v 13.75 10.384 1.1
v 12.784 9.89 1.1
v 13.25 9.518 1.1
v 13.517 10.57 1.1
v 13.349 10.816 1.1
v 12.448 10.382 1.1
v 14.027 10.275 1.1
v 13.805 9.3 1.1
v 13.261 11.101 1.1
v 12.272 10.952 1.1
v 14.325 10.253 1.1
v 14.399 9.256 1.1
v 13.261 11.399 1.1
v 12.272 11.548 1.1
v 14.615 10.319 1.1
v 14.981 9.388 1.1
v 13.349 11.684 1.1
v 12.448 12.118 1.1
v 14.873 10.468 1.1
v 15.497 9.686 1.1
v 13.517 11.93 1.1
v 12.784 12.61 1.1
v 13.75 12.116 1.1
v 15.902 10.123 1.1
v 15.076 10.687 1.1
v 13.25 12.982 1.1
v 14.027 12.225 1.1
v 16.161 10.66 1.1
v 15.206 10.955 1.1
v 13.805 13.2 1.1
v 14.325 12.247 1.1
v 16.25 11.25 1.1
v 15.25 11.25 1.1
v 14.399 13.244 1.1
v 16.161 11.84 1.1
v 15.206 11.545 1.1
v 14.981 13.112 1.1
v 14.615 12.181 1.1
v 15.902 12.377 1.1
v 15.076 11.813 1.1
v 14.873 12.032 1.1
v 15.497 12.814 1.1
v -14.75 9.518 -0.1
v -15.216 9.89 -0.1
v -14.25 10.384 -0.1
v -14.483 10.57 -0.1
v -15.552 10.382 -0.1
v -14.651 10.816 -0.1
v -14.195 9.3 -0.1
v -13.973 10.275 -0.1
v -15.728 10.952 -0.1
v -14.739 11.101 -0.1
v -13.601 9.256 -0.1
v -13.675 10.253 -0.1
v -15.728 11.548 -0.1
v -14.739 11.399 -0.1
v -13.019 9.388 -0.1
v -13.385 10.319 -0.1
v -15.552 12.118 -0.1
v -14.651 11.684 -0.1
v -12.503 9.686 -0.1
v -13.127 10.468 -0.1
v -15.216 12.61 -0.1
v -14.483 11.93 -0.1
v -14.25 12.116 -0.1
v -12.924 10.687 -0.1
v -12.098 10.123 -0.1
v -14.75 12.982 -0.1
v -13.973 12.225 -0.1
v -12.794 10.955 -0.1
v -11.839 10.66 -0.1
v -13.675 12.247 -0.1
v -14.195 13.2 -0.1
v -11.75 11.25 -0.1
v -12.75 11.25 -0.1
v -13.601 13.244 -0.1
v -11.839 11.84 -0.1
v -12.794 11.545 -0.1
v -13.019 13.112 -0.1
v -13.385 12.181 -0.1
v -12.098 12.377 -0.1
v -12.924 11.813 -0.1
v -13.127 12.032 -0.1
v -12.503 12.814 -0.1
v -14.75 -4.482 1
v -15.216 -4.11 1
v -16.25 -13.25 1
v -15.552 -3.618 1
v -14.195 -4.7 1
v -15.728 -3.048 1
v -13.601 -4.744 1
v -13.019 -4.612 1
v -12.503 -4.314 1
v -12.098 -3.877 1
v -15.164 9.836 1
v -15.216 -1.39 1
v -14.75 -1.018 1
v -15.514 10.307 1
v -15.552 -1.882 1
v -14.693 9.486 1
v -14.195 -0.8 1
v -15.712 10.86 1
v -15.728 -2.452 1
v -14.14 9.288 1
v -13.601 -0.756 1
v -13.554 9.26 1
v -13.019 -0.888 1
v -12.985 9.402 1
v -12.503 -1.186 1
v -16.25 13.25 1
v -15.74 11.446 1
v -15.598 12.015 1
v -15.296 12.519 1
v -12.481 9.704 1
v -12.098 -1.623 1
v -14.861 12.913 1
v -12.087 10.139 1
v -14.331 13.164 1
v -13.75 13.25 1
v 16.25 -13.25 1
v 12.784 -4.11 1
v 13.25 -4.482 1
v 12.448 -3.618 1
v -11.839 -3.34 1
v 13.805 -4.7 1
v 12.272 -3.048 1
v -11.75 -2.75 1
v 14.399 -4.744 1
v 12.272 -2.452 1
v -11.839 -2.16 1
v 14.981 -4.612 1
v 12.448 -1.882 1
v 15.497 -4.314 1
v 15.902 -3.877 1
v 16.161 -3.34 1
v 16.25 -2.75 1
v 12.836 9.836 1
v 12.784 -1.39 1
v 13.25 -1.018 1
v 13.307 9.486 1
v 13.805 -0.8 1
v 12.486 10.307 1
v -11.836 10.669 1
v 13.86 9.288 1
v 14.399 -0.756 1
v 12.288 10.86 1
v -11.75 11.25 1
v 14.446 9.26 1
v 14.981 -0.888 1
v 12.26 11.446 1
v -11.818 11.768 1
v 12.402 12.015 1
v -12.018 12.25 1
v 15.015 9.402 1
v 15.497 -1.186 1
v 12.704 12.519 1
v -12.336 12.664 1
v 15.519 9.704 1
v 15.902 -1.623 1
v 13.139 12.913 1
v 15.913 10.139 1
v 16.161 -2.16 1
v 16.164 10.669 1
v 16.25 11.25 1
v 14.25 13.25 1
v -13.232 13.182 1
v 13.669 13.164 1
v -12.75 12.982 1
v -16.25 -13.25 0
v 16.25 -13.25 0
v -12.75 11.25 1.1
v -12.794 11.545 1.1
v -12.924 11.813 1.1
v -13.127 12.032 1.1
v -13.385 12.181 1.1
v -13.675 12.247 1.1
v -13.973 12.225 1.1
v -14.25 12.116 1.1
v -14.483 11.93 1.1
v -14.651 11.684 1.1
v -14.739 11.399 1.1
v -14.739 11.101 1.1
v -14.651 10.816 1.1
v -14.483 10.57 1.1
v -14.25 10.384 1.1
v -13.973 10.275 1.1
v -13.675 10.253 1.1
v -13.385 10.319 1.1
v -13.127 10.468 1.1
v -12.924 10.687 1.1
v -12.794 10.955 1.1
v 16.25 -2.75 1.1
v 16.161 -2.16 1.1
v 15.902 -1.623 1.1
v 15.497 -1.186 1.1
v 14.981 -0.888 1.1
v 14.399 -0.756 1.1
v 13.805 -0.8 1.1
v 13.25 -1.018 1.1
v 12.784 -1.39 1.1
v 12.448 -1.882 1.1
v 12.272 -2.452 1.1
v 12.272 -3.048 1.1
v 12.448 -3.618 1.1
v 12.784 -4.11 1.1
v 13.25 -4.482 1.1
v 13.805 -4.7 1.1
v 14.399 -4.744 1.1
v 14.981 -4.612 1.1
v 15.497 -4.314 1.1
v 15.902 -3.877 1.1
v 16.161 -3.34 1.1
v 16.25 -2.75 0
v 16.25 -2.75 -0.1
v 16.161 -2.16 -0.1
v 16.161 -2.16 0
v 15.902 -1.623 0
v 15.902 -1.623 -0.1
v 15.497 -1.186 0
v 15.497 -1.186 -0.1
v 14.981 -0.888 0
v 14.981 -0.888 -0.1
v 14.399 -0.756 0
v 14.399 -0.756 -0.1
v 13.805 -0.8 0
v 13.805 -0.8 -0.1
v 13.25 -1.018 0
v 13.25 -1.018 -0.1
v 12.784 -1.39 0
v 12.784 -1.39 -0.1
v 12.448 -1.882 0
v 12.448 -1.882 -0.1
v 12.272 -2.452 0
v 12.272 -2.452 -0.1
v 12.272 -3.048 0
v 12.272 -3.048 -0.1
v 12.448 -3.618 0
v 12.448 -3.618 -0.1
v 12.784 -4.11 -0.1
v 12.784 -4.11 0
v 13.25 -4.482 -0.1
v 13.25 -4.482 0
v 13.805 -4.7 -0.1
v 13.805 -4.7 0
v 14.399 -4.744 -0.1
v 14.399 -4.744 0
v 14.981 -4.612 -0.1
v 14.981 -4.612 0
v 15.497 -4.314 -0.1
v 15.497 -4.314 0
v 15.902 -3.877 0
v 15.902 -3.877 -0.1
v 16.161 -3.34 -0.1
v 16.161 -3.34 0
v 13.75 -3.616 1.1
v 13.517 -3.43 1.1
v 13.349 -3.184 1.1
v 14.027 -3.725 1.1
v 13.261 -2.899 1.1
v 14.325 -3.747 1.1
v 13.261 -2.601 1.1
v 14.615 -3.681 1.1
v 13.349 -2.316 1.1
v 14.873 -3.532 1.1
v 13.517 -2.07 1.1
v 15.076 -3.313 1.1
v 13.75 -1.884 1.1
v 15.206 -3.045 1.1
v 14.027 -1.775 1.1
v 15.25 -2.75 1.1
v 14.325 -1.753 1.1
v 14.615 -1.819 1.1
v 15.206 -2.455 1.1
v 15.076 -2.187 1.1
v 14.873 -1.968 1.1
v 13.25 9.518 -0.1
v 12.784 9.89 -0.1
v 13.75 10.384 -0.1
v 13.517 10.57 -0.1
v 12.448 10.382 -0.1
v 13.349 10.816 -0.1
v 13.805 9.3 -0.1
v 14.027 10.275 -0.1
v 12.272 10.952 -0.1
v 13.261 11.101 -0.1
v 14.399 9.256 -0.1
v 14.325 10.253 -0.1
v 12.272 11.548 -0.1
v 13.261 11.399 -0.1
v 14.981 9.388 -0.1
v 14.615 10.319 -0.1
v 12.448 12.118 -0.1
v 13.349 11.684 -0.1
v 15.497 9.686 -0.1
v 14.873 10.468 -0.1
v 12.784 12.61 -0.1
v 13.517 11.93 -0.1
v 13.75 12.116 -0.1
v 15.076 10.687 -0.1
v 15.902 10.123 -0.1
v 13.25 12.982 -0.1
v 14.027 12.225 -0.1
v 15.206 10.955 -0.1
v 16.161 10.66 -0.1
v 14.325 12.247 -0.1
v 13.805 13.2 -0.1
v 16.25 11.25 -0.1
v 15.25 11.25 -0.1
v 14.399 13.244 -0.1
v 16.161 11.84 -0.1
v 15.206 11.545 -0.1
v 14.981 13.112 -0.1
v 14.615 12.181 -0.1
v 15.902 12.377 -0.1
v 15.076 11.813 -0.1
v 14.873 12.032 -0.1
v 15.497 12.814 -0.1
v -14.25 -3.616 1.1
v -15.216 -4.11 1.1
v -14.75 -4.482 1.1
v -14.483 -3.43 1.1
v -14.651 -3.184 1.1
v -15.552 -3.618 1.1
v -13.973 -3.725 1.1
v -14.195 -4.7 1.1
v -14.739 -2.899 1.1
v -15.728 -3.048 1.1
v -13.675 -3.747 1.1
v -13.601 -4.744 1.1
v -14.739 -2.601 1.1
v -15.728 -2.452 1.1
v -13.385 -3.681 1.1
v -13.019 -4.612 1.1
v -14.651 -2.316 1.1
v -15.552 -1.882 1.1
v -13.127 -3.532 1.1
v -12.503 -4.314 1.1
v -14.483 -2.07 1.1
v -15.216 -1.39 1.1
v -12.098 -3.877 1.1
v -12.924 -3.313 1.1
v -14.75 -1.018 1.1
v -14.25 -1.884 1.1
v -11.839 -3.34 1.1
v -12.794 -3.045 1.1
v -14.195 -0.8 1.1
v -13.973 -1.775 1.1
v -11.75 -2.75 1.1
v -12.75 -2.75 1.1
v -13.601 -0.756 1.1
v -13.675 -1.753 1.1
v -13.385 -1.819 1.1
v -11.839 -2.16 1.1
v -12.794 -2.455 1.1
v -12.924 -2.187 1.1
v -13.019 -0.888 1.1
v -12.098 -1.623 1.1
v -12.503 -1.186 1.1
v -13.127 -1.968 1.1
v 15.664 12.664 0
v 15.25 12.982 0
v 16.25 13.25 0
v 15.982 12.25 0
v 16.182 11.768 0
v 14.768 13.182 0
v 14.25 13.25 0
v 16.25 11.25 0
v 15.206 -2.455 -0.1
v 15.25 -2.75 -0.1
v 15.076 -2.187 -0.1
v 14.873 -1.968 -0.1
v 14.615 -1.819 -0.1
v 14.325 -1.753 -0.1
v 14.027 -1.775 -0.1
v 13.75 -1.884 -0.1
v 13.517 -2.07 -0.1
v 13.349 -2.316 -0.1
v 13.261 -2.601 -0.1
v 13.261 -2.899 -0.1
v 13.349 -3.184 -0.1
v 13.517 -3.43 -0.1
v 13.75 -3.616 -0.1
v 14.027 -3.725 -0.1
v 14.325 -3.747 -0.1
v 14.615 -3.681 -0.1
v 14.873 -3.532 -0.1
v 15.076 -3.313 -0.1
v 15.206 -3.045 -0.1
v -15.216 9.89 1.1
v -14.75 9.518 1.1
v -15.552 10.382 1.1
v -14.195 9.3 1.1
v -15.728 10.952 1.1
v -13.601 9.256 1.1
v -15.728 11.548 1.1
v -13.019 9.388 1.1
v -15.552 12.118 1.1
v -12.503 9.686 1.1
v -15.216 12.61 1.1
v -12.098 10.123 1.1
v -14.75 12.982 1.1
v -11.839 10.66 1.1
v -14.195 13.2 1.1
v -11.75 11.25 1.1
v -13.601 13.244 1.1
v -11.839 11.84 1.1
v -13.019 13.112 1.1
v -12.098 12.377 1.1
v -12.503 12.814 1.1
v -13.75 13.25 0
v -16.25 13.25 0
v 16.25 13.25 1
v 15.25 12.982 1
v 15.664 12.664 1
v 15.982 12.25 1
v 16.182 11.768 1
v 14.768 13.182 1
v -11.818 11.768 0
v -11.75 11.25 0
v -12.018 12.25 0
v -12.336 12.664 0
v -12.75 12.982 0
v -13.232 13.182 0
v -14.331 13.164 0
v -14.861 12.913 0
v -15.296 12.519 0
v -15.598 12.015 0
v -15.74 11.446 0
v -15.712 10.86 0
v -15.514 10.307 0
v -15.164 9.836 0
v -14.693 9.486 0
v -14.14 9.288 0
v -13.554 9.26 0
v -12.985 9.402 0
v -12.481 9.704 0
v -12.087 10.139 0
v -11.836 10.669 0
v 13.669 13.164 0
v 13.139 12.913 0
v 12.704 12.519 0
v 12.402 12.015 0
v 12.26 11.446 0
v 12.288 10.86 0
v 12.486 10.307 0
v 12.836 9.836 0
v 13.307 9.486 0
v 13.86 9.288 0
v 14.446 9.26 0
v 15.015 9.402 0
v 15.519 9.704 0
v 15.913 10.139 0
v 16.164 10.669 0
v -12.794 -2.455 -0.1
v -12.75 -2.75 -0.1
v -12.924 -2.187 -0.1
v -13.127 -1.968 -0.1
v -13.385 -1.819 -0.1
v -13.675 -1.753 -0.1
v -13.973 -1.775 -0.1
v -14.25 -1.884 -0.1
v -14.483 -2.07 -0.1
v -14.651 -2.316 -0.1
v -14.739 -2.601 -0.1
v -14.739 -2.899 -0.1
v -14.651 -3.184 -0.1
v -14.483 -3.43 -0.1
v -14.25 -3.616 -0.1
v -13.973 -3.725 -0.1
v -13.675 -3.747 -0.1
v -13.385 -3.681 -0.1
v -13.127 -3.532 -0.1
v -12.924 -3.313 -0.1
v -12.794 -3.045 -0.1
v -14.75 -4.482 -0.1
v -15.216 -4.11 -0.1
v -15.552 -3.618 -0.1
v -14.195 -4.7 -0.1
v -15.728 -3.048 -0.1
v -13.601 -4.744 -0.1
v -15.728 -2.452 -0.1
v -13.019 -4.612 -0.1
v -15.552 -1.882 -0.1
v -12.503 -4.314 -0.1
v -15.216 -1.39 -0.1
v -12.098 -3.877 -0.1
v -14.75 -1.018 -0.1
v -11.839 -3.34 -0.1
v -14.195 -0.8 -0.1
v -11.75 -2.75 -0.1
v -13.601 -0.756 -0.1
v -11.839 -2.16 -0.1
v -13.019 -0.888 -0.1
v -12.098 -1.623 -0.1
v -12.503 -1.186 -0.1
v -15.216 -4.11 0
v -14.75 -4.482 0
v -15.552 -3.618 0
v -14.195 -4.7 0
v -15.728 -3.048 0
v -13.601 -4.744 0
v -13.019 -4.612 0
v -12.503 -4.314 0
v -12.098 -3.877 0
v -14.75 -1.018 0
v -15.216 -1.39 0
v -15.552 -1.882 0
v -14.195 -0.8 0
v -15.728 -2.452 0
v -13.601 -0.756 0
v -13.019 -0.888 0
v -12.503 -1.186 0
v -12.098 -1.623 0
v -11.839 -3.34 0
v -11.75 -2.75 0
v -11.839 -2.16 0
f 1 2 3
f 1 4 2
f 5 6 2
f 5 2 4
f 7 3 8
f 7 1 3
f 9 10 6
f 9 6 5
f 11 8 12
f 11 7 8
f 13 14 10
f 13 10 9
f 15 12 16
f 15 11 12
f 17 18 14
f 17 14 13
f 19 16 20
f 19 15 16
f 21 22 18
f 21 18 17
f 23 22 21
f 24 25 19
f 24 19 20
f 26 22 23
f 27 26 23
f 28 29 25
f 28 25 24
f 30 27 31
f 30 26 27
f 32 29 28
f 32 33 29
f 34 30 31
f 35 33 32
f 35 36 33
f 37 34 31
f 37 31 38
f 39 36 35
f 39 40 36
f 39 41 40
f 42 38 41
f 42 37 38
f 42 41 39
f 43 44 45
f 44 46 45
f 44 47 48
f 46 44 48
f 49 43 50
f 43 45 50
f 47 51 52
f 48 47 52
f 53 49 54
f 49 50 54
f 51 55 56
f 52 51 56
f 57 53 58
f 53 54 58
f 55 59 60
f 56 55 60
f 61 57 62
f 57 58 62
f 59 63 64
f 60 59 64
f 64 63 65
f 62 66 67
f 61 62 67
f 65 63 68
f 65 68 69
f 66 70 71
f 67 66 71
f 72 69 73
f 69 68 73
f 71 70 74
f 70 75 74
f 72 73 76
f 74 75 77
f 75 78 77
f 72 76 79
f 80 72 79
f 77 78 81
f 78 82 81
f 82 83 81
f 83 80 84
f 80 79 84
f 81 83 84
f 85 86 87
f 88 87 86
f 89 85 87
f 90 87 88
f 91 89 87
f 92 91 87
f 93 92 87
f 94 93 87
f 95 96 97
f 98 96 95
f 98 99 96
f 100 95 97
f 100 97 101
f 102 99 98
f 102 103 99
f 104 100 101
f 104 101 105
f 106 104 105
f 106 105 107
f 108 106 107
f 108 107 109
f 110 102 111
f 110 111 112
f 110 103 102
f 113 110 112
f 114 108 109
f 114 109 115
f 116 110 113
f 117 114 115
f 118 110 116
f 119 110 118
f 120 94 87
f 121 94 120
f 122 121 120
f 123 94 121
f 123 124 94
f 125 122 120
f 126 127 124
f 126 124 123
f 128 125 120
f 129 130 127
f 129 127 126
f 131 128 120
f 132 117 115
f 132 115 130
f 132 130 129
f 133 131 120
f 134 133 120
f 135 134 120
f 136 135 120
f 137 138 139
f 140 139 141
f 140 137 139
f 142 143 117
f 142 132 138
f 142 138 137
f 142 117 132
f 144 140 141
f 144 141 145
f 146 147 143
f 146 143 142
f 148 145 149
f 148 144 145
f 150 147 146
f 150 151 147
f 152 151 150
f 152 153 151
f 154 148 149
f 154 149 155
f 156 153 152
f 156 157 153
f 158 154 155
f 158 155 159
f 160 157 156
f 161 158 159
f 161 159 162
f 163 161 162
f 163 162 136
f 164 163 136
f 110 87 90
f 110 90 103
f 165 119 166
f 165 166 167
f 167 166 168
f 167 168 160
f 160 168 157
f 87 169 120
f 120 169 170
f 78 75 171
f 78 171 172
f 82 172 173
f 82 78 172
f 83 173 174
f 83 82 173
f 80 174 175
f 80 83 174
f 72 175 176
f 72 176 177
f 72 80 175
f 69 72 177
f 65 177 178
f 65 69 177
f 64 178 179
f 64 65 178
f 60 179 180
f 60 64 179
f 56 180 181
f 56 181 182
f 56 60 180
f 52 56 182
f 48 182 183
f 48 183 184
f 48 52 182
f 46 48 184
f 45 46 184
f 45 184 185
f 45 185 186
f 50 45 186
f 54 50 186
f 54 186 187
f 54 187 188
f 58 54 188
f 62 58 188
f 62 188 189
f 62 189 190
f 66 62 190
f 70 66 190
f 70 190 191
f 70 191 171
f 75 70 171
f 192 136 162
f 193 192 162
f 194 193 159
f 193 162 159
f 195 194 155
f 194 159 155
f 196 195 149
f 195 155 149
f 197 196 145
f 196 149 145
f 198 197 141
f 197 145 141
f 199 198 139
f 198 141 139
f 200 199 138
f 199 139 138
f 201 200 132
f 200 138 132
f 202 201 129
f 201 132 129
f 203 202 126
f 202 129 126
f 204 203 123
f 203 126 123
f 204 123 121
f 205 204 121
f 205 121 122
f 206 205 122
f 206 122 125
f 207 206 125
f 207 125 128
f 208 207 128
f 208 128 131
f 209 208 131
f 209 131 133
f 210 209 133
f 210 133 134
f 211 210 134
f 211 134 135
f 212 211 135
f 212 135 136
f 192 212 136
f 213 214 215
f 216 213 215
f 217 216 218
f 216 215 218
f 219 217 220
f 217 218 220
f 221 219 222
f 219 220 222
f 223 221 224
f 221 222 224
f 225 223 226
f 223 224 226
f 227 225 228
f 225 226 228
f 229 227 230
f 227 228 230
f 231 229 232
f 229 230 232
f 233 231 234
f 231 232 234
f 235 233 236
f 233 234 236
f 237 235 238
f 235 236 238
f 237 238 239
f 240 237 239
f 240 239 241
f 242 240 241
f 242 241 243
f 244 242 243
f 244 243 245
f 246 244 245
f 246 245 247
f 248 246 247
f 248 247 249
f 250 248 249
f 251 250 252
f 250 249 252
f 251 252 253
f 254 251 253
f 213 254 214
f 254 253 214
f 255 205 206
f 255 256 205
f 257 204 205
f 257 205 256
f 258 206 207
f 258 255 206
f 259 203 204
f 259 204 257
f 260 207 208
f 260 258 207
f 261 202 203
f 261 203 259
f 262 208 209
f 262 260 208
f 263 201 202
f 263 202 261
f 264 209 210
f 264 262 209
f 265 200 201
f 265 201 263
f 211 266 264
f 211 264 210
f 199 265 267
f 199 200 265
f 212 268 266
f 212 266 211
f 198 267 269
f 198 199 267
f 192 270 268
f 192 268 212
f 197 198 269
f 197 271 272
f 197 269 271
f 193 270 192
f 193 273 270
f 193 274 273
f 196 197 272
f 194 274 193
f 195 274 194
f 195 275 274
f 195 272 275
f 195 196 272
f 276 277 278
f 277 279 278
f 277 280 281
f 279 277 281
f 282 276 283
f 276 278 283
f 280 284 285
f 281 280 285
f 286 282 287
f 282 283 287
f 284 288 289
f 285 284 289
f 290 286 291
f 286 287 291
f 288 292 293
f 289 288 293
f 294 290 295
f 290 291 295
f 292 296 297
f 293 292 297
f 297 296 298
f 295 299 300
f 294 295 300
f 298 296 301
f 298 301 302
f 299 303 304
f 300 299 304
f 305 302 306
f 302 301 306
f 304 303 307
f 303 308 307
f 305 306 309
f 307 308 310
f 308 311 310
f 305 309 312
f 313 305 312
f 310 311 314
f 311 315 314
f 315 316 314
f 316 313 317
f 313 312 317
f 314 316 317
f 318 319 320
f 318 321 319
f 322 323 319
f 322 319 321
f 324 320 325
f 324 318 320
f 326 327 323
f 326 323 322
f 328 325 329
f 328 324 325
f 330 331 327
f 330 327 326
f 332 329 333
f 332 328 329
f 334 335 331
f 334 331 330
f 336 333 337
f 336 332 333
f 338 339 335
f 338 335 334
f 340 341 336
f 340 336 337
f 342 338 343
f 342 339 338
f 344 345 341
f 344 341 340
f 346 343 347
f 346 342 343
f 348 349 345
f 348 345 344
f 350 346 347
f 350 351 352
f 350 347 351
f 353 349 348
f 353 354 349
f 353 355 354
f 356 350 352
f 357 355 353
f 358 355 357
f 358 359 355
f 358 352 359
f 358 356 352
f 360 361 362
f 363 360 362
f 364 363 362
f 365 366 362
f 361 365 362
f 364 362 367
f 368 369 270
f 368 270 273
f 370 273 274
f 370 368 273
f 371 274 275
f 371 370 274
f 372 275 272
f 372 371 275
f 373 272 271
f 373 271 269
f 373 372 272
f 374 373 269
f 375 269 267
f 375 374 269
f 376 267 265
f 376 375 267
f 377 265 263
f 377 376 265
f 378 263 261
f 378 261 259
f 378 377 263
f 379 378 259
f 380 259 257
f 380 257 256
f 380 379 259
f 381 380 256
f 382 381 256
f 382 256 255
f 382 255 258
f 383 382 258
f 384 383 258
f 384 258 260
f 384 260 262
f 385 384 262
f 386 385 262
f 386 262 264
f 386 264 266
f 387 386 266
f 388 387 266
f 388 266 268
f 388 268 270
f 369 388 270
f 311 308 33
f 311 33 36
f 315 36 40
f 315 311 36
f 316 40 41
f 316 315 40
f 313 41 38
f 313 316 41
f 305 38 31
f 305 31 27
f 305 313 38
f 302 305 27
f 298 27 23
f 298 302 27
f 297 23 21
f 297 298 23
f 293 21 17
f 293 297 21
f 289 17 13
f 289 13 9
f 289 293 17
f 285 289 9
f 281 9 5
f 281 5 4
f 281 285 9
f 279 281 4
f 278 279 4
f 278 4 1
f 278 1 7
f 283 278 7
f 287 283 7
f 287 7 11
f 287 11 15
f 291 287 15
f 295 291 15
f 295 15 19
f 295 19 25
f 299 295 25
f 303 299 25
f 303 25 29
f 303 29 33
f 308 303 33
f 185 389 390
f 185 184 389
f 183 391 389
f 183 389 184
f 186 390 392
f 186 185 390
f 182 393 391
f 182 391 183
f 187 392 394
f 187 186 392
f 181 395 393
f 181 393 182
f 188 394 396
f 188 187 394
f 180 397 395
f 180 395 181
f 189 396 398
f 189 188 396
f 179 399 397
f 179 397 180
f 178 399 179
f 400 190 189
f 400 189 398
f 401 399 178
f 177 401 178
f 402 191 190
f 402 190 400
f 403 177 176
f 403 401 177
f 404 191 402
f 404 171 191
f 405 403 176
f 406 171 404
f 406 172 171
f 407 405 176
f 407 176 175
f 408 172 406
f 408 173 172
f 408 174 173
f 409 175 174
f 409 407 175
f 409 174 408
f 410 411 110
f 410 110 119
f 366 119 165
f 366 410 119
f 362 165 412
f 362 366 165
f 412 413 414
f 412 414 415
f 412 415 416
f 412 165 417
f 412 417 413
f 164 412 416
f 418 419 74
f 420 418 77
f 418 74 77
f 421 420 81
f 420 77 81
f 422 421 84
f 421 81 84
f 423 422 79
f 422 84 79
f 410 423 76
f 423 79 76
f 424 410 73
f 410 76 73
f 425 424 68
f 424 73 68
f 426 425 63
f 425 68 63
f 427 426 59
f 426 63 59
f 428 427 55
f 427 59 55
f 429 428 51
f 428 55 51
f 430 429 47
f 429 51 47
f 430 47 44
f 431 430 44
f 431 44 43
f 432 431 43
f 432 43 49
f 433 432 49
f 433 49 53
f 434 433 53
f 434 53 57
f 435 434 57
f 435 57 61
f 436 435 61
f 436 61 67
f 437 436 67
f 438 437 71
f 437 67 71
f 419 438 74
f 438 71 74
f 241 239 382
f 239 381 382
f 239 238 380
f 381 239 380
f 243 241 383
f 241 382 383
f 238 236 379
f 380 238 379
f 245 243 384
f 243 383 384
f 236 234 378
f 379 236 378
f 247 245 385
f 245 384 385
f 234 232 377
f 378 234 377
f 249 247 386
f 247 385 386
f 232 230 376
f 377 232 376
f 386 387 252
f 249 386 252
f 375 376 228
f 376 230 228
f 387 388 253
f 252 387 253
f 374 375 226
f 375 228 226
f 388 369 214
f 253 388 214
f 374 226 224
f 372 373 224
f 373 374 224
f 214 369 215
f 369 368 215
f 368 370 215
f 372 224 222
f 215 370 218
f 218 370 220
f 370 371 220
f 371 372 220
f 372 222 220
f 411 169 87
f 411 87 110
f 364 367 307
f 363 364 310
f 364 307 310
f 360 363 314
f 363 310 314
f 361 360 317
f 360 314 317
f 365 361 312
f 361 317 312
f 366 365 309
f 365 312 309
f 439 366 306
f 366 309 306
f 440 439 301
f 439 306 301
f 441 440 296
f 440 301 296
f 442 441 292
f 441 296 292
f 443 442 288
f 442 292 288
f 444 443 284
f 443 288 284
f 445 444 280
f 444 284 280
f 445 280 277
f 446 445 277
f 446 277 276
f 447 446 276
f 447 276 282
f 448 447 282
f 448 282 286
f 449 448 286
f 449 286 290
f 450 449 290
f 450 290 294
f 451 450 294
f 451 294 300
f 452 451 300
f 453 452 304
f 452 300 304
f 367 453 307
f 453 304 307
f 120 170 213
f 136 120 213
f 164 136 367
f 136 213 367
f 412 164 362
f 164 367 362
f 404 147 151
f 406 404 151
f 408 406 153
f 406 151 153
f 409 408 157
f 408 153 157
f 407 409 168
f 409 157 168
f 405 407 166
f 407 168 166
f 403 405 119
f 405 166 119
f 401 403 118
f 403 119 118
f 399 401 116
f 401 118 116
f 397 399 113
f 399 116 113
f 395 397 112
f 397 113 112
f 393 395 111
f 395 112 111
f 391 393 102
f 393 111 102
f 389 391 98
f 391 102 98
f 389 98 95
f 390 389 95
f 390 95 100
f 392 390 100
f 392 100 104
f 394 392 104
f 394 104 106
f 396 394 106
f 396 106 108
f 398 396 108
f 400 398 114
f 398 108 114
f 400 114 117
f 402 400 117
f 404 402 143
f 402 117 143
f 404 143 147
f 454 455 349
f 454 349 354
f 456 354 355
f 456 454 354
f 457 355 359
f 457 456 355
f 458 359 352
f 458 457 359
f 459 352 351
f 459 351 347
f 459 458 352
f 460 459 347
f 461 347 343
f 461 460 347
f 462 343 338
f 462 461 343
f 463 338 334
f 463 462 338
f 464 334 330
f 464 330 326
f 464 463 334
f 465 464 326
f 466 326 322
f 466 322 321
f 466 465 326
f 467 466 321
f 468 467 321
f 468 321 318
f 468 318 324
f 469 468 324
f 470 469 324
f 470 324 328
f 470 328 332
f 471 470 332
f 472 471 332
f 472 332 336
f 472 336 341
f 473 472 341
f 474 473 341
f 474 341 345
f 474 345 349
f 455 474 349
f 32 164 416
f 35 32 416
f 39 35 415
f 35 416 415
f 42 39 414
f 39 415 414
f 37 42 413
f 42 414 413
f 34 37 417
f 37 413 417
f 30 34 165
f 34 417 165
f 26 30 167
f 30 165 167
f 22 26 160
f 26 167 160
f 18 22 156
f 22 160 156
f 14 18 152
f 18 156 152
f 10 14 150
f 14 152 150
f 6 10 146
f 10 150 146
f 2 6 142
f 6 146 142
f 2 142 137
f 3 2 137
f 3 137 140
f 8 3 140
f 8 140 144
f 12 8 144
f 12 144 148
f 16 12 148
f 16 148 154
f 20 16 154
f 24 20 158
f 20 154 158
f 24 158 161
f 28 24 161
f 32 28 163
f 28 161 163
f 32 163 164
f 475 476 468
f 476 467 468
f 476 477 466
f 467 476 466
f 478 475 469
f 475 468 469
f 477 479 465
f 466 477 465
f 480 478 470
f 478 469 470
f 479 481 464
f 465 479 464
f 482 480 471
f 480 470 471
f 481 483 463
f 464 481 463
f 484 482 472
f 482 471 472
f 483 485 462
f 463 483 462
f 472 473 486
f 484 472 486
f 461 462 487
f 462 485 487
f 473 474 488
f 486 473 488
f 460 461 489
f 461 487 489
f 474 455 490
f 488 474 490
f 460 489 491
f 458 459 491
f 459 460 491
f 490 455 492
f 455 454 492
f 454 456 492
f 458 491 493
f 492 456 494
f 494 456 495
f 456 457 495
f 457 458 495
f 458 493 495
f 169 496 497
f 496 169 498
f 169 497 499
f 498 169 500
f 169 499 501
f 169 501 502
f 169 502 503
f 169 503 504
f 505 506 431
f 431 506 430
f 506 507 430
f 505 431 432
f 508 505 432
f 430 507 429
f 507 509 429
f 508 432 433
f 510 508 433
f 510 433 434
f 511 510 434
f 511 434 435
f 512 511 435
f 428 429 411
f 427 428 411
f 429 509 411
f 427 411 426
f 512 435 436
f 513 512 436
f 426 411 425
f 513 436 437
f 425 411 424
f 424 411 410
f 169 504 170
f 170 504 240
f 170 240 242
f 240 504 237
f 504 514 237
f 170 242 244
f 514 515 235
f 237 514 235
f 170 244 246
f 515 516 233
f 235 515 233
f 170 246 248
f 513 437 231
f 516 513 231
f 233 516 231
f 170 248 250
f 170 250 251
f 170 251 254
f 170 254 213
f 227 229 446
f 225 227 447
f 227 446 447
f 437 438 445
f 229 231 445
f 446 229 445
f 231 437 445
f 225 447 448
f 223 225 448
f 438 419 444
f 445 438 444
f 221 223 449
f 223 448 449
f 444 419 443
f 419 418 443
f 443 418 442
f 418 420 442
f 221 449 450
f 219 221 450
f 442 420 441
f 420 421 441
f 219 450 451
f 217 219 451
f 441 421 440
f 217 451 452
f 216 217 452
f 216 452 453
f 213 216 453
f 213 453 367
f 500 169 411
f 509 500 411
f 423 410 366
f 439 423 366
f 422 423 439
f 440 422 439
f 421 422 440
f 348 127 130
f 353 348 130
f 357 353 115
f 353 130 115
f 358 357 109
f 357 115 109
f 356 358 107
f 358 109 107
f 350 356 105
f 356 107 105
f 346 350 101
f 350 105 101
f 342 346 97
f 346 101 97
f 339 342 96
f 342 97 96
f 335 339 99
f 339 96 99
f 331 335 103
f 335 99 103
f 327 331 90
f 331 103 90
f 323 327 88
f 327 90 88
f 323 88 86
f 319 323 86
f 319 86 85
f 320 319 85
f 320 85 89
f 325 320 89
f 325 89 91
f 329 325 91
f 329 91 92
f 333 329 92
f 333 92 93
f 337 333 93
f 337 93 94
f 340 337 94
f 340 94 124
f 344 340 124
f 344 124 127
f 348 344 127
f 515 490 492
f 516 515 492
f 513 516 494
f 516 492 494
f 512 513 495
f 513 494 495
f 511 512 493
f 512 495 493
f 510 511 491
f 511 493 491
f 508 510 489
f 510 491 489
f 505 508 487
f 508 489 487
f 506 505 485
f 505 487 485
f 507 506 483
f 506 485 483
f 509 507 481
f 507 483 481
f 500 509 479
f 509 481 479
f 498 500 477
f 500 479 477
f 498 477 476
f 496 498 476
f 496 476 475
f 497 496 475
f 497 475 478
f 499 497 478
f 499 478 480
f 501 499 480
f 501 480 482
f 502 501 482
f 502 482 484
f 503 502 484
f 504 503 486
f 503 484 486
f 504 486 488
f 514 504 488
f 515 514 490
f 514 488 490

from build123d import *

# Parameters (mm, degrees)
SKETCH1_W                = 32.5
SKETCH1_H                = 26.5
BOSS_EXTRUDE1_DEPTH      = 1
SKETCH2_R                = 1
CUT_EXTRUDE1_DEPTH       = 2
BOSS_EXTRUDE3_DEPTH      = 0.1
BOSS_EXTRUDE3_DEPTH_BACK = 1.1
SKETCH3_R                = 2
SKETCH3_R_2              = 1


with BuildPart() as part:
    # Sketch1 → Boss-Extrude1 (new body)
    with BuildSketch(Plane.XY):
        Rectangle(SKETCH1_W, SKETCH1_H)
    extrude(amount=BOSS_EXTRUDE1_DEPTH)

    # Sketch2 → Cut-Extrude1 (cut)
    with BuildSketch(Plane.XY.offset(1)):
        with Locations((-13.75, 11.25)):
            Circle(SKETCH2_R)
        with Locations((-13.75, -2.75)):
            Circle(SKETCH2_R)
        with Locations((14.25, -2.75)):
            Circle(SKETCH2_R)
        with Locations((14.25, 11.25)):
            Circle(SKETCH2_R)
    extrude(amount=-CUT_EXTRUDE1_DEPTH, mode=Mode.SUBTRACT)

    # Sketch3 → Boss-Extrude3 (add, two sides: drawn at the far end of the back side and taken through both)
    # profile 1 of 4: a face of its own
    with BuildSketch(Plane.XY.offset(1).offset(-BOSS_EXTRUDE3_DEPTH_BACK)):
        with Locations((-13.75, 11.25)):
            Circle(SKETCH3_R)
        with Locations((-13.75, 11.25)):
            Circle(SKETCH3_R_2, mode=Mode.SUBTRACT)
    # profile 2 of 4: a face of its own
    with BuildSketch(Plane.XY.offset(1).offset(-BOSS_EXTRUDE3_DEPTH_BACK)):
        with Locations((14.25, 11.25)):
            Circle(SKETCH3_R)
        with Locations((14.25, 11.25)):
            Circle(SKETCH3_R_2, mode=Mode.SUBTRACT)
    # profile 3 of 4: a face of its own
    with BuildSketch(Plane.XY.offset(1).offset(-BOSS_EXTRUDE3_DEPTH_BACK)):
        with Locations((14.25, -2.75)):
            Circle(SKETCH3_R)
        with Locations((14.25, -2.75)):
            Circle(SKETCH3_R_2, mode=Mode.SUBTRACT)
    # profile 4 of 4: a face of its own
    with BuildSketch(Plane.XY.offset(1).offset(-BOSS_EXTRUDE3_DEPTH_BACK)):
        with Locations((-13.75, -2.75)):
            Circle(SKETCH3_R)
        with Locations((-13.75, -2.75)):
            Circle(SKETCH3_R_2, mode=Mode.SUBTRACT)
    extrude(amount=BOSS_EXTRUDE3_DEPTH + BOSS_EXTRUDE3_DEPTH_BACK)


solid = part.part
